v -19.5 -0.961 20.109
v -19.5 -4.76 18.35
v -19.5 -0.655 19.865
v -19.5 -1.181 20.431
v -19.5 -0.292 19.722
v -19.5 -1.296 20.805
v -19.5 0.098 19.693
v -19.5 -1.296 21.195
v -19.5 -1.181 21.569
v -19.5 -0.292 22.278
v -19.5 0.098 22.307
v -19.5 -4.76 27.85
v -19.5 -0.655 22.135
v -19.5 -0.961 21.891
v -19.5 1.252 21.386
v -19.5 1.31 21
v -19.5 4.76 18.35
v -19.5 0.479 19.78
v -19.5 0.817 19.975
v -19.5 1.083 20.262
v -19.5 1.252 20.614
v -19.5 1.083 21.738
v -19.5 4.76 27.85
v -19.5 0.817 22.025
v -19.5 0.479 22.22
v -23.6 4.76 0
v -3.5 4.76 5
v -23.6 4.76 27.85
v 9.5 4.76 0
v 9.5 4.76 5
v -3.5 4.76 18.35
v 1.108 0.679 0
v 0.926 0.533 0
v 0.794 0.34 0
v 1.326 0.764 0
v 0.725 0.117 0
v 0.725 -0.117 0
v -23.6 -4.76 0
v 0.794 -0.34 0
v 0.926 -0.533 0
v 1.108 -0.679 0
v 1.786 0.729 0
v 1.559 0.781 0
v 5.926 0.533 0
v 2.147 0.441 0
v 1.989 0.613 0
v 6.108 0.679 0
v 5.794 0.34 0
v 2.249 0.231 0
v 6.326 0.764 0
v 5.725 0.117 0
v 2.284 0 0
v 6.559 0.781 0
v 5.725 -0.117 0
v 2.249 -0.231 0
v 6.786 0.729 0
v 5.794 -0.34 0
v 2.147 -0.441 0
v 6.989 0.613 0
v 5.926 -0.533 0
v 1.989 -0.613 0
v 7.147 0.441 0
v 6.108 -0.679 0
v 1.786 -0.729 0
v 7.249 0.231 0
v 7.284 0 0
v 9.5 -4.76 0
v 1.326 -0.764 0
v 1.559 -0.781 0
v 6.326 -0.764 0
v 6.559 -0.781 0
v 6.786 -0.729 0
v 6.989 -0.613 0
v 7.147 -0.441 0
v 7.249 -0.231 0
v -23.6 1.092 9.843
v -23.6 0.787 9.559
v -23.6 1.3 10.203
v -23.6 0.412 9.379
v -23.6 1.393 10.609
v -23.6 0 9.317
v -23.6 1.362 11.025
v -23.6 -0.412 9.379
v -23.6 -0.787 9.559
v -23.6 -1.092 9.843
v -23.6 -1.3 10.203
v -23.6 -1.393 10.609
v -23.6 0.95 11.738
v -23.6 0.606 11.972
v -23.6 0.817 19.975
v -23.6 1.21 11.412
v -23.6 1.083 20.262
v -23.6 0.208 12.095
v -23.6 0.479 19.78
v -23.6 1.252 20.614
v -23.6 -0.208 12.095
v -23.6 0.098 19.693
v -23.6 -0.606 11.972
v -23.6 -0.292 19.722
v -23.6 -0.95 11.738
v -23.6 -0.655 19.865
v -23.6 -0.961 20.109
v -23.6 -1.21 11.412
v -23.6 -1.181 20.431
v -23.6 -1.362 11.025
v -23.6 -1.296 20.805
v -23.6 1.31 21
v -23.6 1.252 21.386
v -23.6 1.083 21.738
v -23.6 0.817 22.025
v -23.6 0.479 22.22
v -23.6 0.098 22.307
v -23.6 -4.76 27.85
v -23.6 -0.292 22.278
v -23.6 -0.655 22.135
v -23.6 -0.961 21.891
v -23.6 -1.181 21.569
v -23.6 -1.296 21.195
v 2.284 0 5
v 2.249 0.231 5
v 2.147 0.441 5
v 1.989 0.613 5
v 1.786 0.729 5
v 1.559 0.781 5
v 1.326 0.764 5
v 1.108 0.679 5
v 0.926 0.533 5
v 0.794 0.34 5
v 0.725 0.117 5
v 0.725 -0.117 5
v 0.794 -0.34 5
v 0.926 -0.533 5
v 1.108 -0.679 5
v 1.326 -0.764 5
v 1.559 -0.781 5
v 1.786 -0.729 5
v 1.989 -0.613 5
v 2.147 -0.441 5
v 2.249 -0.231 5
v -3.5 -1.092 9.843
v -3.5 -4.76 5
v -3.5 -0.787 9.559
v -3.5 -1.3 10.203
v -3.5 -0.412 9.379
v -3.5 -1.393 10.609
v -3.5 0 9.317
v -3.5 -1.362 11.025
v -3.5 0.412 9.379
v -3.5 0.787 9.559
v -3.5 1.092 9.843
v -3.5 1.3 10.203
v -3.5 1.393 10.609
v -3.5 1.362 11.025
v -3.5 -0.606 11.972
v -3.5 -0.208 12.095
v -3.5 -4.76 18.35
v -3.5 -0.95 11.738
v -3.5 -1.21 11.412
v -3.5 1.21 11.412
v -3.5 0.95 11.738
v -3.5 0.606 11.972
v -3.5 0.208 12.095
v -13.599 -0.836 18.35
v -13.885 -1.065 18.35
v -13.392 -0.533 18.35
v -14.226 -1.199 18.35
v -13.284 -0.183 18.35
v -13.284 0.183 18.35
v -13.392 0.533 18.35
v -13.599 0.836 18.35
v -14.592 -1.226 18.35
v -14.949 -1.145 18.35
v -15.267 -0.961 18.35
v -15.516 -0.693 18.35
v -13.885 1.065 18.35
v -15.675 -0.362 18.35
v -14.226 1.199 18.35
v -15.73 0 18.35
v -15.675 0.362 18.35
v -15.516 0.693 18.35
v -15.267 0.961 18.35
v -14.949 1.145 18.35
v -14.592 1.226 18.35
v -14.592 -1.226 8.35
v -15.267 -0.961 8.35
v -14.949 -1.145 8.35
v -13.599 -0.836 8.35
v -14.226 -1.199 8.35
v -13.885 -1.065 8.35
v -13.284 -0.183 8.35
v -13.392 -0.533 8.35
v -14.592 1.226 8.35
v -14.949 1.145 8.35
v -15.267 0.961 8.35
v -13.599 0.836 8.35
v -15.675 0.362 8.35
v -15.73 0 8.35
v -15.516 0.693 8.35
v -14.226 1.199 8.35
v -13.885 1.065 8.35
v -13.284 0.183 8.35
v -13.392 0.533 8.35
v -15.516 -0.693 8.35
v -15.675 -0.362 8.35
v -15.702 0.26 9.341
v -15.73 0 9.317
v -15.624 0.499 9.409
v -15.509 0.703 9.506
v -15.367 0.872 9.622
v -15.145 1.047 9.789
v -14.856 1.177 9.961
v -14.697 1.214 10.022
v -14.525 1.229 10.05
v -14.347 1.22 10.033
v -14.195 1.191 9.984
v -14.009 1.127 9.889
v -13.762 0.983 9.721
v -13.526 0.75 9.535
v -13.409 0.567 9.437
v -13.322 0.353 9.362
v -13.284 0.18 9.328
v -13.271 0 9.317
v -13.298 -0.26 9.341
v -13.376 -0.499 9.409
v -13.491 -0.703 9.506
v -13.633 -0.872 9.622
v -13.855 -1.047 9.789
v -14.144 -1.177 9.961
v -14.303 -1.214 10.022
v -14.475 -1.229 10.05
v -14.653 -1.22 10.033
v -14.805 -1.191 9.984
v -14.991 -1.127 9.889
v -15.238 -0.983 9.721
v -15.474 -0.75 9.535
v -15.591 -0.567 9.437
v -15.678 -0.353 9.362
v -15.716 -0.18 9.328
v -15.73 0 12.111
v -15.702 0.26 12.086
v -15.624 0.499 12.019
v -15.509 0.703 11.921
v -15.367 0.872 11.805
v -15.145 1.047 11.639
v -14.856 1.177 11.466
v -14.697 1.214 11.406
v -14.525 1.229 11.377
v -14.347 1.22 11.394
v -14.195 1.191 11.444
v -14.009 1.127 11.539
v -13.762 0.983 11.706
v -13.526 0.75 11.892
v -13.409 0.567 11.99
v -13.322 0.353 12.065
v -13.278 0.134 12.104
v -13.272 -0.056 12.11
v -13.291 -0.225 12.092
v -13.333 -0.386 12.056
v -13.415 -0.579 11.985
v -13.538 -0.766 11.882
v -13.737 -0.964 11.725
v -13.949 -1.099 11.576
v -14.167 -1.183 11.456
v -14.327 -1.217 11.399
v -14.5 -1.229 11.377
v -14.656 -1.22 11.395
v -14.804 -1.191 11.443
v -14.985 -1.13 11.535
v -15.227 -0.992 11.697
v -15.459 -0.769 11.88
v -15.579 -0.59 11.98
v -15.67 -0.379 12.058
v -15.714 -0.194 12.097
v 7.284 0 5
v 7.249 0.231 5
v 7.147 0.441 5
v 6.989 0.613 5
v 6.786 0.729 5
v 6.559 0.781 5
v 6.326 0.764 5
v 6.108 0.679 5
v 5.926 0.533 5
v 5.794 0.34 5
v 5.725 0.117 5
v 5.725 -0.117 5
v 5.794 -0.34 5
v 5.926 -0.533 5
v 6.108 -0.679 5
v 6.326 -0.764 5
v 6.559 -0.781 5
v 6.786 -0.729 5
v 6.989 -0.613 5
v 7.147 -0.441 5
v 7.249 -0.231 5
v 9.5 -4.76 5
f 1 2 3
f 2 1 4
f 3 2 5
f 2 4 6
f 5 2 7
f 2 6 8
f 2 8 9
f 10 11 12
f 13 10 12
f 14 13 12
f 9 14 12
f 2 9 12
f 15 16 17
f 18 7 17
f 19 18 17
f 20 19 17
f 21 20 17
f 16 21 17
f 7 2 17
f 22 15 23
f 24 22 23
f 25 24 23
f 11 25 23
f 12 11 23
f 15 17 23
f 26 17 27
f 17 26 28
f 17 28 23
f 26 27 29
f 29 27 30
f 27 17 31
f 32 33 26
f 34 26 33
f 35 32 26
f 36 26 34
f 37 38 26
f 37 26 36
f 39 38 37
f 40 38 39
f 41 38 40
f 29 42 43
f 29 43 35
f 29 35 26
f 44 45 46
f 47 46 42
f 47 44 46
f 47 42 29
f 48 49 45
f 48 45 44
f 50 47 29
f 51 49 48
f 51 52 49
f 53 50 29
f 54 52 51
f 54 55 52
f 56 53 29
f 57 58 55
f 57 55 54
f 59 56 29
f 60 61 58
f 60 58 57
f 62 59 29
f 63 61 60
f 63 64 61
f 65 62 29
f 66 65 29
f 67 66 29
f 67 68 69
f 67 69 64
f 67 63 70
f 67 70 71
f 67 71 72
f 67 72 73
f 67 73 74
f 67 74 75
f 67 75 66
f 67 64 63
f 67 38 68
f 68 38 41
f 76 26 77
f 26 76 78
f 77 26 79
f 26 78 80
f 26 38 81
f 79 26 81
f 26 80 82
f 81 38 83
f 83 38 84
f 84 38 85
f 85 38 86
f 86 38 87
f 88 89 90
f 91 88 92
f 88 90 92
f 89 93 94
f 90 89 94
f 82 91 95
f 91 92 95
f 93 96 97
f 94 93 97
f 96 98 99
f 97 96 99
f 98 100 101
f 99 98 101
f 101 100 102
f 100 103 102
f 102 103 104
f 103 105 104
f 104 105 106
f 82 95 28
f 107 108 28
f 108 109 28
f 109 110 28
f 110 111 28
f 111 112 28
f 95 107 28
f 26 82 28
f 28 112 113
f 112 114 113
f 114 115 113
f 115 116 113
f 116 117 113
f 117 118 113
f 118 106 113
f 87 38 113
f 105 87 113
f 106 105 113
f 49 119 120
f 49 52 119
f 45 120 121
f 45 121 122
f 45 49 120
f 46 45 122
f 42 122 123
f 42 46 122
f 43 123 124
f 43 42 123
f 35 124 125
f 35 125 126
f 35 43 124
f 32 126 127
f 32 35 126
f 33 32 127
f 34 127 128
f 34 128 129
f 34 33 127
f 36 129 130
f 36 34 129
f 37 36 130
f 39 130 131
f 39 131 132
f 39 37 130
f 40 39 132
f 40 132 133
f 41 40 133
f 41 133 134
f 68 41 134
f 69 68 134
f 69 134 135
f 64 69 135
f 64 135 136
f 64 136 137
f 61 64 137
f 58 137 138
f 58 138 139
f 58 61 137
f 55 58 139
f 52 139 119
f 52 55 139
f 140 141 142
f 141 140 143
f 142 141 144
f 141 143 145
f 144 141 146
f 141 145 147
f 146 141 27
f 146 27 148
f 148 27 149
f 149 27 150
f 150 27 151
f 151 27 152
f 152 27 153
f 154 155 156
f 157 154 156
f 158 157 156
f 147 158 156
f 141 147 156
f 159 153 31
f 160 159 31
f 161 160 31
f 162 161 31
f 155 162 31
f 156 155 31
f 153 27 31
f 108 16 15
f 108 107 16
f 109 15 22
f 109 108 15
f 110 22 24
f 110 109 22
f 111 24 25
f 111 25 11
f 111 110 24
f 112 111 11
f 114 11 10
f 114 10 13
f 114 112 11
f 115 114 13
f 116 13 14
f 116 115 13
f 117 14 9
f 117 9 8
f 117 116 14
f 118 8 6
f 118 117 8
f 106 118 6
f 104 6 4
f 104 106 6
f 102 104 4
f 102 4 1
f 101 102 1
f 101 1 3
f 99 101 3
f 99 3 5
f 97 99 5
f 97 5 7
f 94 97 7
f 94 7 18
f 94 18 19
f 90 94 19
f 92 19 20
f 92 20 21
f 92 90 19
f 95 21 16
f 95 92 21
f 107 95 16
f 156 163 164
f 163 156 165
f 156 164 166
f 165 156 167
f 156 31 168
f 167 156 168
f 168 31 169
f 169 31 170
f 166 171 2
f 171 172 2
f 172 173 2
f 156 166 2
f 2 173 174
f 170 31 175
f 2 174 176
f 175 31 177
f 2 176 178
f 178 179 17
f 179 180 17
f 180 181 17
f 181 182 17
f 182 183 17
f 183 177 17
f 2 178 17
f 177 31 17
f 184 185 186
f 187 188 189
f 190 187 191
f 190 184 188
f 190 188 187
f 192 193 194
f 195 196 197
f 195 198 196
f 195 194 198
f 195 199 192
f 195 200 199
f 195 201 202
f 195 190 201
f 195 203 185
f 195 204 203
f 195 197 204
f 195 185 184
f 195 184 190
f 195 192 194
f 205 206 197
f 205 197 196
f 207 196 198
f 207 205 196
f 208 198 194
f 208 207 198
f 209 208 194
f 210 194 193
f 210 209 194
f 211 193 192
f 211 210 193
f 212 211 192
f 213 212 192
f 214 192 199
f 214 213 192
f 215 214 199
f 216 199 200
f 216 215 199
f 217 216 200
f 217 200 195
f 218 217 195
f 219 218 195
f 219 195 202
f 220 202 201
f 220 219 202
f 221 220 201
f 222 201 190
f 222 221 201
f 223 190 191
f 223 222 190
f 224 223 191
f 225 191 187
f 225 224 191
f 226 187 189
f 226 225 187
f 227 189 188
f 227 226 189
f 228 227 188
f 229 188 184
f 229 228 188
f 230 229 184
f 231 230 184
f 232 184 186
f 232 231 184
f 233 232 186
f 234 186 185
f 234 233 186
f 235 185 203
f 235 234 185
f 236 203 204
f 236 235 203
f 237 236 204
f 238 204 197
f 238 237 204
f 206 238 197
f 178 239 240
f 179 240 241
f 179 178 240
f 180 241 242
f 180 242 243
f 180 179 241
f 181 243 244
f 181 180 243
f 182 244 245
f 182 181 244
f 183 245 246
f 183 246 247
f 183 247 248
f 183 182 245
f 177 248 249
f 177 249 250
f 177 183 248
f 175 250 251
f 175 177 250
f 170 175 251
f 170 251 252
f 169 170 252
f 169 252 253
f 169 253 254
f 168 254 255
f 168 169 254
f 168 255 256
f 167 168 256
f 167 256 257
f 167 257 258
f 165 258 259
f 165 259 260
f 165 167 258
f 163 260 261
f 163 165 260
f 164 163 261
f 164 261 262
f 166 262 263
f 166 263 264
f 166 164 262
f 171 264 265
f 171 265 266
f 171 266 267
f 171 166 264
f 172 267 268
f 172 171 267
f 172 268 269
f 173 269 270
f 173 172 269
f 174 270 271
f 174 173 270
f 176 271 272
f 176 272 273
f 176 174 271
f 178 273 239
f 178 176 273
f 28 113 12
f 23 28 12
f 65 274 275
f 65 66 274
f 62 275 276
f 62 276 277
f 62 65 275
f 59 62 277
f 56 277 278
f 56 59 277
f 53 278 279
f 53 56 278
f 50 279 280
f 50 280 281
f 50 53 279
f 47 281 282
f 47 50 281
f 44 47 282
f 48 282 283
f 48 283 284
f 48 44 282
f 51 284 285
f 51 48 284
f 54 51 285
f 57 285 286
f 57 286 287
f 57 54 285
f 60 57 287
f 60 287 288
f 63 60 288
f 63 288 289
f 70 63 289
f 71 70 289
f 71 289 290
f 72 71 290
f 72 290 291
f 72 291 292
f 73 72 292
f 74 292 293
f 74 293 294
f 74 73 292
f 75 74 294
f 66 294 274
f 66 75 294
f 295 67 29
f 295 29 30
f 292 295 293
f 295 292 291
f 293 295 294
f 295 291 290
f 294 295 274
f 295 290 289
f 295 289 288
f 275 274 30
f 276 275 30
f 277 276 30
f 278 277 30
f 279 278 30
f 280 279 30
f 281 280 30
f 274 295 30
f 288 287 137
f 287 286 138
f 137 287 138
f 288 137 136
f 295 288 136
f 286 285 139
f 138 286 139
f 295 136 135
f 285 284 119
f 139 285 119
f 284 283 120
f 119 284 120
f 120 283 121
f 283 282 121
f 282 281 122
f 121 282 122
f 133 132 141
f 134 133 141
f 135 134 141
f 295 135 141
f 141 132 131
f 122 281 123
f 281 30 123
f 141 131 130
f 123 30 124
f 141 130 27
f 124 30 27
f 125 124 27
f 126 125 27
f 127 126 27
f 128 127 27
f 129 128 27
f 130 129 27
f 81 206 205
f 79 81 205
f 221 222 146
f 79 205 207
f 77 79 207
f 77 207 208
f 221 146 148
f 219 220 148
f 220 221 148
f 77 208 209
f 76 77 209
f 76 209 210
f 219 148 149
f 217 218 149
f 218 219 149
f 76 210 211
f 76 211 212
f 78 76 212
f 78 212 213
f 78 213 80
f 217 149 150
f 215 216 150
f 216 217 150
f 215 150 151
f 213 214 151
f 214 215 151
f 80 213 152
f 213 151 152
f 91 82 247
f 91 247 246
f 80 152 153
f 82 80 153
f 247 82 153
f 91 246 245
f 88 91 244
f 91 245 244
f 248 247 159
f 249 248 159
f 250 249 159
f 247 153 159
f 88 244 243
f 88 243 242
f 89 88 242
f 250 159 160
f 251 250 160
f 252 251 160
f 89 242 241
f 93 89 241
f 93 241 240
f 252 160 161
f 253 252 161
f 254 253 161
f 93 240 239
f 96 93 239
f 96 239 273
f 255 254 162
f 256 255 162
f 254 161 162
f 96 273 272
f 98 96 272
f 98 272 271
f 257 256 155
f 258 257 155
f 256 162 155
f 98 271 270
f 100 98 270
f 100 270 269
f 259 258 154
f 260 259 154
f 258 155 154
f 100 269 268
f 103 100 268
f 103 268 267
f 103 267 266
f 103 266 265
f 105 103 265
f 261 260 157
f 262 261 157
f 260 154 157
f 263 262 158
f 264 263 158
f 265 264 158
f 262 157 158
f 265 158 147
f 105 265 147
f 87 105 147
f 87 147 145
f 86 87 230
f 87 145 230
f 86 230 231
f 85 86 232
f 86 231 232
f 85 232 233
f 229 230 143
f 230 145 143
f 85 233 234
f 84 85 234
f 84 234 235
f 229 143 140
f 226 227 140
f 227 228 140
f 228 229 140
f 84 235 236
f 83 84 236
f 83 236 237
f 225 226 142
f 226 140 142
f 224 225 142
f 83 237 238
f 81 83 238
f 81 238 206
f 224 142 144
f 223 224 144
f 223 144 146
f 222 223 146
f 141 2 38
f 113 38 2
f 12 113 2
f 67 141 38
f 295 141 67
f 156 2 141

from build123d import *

# Parameters (mm, degrees)
SKETCH1_W                    = 33.1
SKETCH1_H                    = 27.85
BOSS_EXTRUDE1_DEPTH          = 9.52
SKETCH2_W                    = 13
SKETCH2_H                    = 22.849999999
CUT_EXTRUDE1_DEPTH           = 38.725494033
SKETCH3_W                    = 16
SKETCH3_H                    = 9.5
CUT_EXTRUDE2_DEPTH           = 38.725494033
F_97_0_0059_DIAMETER_HOLE1_D = 2.794


with BuildPart() as part:
    # Sketch1 → Boss-Extrude1 (new body)
    with BuildSketch(Plane.XZ.offset(4.76)):
        with Locations((-7.05, 13.925)):
            Rectangle(SKETCH1_W, SKETCH1_H)
    extrude(amount=-BOSS_EXTRUDE1_DEPTH)

    # Sketch2 → Cut-Extrude1 (cut, through all)
    with BuildSketch(Plane(origin=(0, 4.76, 0), x_dir=(-1, 0, 0), z_dir=(0, 1, 0))):
        with Locations((-3, 16.425)):
            Rectangle(SKETCH2_W, SKETCH2_H)
    extrude(amount=-CUT_EXTRUDE1_DEPTH, mode=Mode.SUBTRACT)

    # Sketch3 → Cut-Extrude2 (cut, through all)
    with BuildSketch(Plane(origin=(0, 4.76, 0), x_dir=(-1, 0, 0), z_dir=(0, 1, 0))):
        with Locations((11.5, 23.1)):
            Rectangle(SKETCH3_W, SKETCH3_H)
    extrude(amount=-CUT_EXTRUDE2_DEPTH, mode=Mode.SUBTRACT)

    # Sketch4 → Cut-Revolve1 (revolve, cut)
    with BuildSketch(Plane(origin=(0, 0, 0), x_dir=(1, 0, 0), z_dir=(0, 1, 0))):
        Polygon((7.2835, 0), (6.5, 0), (6.5, -5.000000001), (7.2835, -5.000000001), (7.2835, -2), align=None)
    revolve(axis=Axis((6.5, 0, 0), (0, 0, 1)), mode=Mode.SUBTRACT)

    # Sketch5 → Cut-Revolve2 (revolve, cut)
    with BuildSketch(Plane(origin=(0, 0, 0), x_dir=(1, 0, 0), z_dir=(0, 1, 0))):
        Polygon((2.2835, 0), (1.5, 0), (1.5, -5.000000001), (2.2835, -5.000000001), (2.2835, -2), align=None)
    revolve(axis=Axis((1.5, 0, 0), (0, 0, 1)), mode=Mode.SUBTRACT)

    # Sketch6 → Cut-Revolve3 (revolve, cut)
    with BuildSketch(Plane.XZ, mode=Mode.PRIVATE) as cut_revolve3_sk:
        Polygon((-13.2705, 18.35), (-14.5, 18.35), (-14.5, 8.35), (-13.2705, 8.35), (-13.2705, 16.35), align=None)
    revolve(cut_revolve3_sk.sketch.rotate(Axis((-14.5, 0, 18.35), (0, 0, -1)), 180), axis=Axis((-14.5, 0, 18.35), (0, 0, -1)), mode=Mode.SUBTRACT)

    # Sketch7 → Cut-Revolve4 (revolve, cut)
    with BuildSketch(Plane.XY.offset(21)):
        Polygon((-23.6, 1.3105), (-23.6, 0), (-19.5, 0), (-19.5, 1.3105), (-21.6, 1.3105), align=None)
    revolve(axis=Axis((-23.6, 0, 21), (1, 0, 0)), mode=Mode.SUBTRACT)

    # #97 (0.0059) Diameter Hole1 (through all)
    with Locations(Plane.ZY.offset(23.6)):
        with Locations((10.71372, 0)):
            Hole(F_97_0_0059_DIAMETER_HOLE1_D / 2)


solid = part.part
